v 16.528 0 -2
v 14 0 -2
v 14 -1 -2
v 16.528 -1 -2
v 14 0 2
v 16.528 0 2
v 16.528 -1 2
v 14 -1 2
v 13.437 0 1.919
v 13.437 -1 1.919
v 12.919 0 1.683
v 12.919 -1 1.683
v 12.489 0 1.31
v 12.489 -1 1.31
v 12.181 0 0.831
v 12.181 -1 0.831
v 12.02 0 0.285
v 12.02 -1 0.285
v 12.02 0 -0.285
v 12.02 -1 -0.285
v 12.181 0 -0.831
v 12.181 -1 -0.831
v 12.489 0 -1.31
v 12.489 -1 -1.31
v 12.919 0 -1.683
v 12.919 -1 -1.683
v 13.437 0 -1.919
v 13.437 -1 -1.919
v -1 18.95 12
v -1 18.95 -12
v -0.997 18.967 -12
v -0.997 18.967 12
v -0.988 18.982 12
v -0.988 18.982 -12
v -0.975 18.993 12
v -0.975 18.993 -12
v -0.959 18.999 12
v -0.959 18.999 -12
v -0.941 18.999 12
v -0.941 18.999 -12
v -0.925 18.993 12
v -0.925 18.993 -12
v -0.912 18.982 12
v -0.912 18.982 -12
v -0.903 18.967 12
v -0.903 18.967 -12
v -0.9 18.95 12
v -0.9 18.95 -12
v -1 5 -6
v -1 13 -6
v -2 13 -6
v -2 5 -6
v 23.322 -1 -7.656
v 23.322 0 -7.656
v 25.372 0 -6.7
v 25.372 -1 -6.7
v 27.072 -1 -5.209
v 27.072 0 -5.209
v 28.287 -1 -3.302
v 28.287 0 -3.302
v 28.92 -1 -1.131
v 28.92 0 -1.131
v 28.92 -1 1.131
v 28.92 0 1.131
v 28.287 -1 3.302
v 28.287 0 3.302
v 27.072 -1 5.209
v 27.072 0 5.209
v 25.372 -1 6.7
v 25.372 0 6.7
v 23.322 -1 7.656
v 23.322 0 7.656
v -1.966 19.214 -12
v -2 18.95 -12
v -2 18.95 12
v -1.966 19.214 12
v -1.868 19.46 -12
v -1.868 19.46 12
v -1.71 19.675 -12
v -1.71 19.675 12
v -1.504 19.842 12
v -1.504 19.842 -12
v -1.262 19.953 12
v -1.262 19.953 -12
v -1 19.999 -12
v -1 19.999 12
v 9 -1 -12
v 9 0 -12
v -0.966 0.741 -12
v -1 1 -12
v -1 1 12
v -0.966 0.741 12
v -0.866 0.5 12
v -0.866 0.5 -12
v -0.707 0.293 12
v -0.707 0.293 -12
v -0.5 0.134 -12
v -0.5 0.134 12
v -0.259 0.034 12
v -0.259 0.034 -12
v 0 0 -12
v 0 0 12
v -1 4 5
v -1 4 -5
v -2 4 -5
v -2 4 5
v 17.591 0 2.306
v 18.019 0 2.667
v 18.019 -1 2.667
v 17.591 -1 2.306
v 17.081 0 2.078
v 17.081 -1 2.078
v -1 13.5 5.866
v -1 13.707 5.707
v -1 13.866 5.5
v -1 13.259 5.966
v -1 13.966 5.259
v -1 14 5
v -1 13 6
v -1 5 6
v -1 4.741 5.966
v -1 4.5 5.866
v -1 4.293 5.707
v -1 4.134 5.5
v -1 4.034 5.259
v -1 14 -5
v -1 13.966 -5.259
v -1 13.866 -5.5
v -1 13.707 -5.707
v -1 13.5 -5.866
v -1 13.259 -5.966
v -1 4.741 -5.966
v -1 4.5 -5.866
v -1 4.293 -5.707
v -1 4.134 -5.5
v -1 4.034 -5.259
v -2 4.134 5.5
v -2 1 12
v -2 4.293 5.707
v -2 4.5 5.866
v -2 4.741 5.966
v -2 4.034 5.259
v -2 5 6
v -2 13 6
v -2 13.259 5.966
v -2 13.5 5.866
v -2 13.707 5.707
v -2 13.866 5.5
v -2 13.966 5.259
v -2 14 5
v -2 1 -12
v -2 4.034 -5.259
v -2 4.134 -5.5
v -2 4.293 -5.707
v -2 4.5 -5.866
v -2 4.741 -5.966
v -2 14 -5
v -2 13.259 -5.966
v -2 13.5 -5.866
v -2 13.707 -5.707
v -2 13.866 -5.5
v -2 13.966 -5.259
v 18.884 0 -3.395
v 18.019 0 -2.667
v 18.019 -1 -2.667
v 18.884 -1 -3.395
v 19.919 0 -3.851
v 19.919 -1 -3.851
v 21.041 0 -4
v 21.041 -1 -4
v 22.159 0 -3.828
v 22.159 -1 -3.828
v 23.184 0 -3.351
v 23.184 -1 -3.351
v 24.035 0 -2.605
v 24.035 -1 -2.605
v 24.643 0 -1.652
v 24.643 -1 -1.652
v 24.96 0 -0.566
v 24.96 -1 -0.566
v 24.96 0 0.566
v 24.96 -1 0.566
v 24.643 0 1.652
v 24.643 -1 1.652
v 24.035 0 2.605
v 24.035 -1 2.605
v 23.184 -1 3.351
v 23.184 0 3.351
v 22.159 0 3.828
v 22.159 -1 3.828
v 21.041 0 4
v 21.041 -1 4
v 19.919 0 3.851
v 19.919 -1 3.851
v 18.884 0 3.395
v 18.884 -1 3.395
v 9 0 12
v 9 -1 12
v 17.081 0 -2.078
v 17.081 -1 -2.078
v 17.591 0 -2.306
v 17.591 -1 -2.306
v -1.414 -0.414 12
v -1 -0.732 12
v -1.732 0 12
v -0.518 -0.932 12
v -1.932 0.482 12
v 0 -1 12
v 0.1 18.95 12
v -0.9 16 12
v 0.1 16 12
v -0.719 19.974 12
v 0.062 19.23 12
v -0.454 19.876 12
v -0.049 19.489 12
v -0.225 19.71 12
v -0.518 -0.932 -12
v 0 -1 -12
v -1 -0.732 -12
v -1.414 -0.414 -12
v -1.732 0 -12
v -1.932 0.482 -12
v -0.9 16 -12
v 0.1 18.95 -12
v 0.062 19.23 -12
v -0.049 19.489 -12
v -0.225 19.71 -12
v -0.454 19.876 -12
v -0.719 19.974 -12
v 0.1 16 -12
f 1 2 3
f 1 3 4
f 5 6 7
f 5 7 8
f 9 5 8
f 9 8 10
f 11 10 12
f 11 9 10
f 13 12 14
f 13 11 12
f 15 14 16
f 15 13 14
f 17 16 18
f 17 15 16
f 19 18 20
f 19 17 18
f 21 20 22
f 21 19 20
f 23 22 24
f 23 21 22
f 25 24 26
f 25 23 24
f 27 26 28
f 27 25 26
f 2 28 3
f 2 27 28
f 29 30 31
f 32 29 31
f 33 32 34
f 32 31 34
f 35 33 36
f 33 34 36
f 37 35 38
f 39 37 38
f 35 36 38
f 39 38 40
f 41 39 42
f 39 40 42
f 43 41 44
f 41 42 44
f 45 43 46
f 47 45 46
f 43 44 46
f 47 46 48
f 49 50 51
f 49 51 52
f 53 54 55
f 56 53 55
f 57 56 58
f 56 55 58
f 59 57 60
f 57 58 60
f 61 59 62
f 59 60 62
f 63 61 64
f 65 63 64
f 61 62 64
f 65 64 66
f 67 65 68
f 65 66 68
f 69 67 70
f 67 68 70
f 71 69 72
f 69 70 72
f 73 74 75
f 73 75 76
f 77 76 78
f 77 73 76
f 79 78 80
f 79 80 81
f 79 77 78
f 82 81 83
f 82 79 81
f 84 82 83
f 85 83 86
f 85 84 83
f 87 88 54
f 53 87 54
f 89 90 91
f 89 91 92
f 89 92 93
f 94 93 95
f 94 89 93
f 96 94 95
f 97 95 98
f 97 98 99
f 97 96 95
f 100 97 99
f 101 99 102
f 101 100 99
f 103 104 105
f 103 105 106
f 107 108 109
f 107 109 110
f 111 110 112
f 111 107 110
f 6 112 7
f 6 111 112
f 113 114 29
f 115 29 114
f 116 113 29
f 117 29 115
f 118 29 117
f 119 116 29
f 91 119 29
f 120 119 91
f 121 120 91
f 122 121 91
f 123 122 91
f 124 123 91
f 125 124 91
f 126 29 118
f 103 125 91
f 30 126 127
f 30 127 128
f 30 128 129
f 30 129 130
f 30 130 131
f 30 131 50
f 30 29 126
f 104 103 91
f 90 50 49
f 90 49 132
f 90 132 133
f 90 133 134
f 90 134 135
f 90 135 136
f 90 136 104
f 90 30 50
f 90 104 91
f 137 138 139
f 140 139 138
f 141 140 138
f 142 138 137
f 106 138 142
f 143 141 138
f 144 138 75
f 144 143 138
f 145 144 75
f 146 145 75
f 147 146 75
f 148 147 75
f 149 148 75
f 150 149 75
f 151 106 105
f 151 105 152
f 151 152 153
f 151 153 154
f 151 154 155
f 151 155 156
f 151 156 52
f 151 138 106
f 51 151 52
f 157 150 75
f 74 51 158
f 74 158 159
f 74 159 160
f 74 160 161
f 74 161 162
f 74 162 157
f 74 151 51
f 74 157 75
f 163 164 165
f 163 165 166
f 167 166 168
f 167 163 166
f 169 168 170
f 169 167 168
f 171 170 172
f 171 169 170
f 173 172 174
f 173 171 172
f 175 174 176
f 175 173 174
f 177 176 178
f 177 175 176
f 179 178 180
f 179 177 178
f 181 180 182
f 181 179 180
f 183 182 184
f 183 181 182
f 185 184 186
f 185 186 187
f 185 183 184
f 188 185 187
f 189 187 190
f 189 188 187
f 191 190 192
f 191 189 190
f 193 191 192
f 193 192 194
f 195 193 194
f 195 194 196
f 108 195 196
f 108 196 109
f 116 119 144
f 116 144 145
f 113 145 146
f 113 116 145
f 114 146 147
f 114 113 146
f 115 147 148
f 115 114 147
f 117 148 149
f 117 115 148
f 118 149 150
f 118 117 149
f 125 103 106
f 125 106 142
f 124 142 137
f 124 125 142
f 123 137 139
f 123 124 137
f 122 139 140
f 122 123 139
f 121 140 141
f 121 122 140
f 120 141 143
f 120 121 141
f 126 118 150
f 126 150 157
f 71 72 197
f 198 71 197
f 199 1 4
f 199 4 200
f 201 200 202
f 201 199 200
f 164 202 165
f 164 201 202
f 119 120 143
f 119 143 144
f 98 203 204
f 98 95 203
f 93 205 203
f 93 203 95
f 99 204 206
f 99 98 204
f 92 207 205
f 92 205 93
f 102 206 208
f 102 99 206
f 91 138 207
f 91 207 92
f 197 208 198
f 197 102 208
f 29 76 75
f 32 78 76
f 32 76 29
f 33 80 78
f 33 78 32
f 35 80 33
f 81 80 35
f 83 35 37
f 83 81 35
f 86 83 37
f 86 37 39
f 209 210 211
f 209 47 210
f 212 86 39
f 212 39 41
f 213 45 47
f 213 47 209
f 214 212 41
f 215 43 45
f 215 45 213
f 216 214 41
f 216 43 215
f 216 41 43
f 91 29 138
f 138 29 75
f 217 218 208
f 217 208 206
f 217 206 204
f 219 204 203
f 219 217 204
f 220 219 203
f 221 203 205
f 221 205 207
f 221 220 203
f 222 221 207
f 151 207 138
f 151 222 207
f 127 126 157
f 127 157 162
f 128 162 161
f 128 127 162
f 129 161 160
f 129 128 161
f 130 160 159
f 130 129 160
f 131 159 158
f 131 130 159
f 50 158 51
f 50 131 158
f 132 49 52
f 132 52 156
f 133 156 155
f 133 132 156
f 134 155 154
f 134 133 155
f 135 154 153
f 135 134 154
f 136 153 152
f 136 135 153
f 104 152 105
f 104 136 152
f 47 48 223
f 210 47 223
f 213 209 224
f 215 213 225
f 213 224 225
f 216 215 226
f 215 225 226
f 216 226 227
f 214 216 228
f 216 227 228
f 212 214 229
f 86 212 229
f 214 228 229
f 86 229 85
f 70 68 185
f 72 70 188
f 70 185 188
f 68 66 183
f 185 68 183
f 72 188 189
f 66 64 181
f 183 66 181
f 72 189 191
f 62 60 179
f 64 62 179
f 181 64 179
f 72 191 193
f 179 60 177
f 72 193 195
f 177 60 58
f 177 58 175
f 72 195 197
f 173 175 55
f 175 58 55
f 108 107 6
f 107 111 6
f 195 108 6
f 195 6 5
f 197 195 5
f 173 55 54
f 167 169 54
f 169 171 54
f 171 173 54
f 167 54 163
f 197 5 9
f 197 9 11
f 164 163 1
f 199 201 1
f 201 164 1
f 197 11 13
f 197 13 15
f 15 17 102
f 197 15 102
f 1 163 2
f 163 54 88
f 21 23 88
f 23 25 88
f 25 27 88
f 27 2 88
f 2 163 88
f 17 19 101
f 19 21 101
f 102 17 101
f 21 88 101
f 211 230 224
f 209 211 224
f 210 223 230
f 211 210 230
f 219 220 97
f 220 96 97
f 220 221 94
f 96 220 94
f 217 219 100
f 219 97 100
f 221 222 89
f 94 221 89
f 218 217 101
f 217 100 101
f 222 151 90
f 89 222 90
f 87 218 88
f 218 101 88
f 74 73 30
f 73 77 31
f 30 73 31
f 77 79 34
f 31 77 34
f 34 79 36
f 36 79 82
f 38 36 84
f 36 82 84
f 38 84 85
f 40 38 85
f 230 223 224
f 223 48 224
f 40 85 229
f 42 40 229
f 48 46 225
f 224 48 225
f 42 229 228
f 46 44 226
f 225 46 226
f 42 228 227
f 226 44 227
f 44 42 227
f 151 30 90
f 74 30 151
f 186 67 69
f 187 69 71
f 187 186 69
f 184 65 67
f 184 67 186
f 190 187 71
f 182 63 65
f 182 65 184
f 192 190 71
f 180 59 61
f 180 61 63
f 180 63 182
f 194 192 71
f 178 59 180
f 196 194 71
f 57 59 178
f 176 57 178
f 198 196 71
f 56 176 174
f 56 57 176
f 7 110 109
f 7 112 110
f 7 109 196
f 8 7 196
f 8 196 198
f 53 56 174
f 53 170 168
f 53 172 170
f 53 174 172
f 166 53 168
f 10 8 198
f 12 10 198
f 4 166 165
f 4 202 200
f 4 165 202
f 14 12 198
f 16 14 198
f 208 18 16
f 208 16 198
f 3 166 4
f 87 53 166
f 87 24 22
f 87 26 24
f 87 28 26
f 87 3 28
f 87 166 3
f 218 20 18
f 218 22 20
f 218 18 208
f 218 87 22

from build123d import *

# Parameters (mm, degrees)
BASE_FLANGE1_DEPTH = 1
EDGE_FLANGE1_DEPTH = 24
HEM1_START         = -12
HEM1_DEPTH         = 24
HEM1_2_DEPTH       = 24
CUT_EXTRUDE1_DEPTH = 10


# Read off the part's stored shape, not the designer's step: Hem1
# Sheet-metal steps are written as plain solids
with BuildPart() as part:
    # Sketch1 → Base-Flange1 (new body)
    with BuildSketch(Plane(origin=(0, 0, 0), x_dir=(1, 0, 0), z_dir=(0, 1, 0))):
        with BuildLine():
            Line((0, 12), (9, 12))
            Line((9, 12), (23.322209849, 7.655543182))
            ThreePointArc((23.322209849, 7.655543182), (29, 0), (23.322209849, -7.655543182))
            Line((23.322209849, -7.655543182), (9, -12))
            Line((9, -12), (0, -12))
            Line((0, -12), (0, 12))
        make_face()
        with BuildLine():
            Line((14, 2), (16.527864045, 2))
            ThreePointArc((16.527864045, 2), (17.344360626, 2.174258142), (18.01857603, 2.666666667))
            ThreePointArc((18.01857603, 2.666666667), (25, 0), (18.01857603, -2.666666667))
            ThreePointArc((18.01857603, -2.666666667), (17.344360626, -2.174258142), (16.527864045, -2))
            Line((16.527864045, -2), (14, -2))
            ThreePointArc((14, -2), (12, 0), (14, 2))
        make_face(mode=Mode.SUBTRACT)
    extrude(amount=-BASE_FLANGE1_DEPTH)

    # Edge-Flange1 section (across the edge) → Edge-Flange1 (add)
    with BuildSketch(Plane(origin=(-1, 0, -12), x_dir=(1, 0, 0), z_dir=(0, 0, 1))):
        with BuildLine():
            Line((-1, 1), (-1, 20))
            Line((-1, 20), (0, 20))
            Line((0, 20), (0, 1))
            ThreePointArc((0, 1), (0.292893219, 0.292893219), (1, 0))
            Line((1, 0), (1, -1))
            ThreePointArc((1, -1), (-0.414213562, -0.414213562), (-1, 1))
        make_face()
    extrude(amount=EDGE_FLANGE1_DEPTH)

    # Hem1 outline → Hem1 (cut)
    with BuildSketch(Plane.XY.offset(HEM1_START)):
        with BuildLine():
            ThreePointArc((-2, 18.95), (-1.709934208, 19.674568837), (-1, 19.998808848))
            Line((-1, 19.998808848), (-1, 20))
            Line((-1, 20), (-2, 20))
            Line((-2, 20), (-2, 18.95))
        make_face()
    extrude(amount=HEM1_DEPTH, mode=Mode.SUBTRACT)

    # Hem1 2 outline → Hem1 2 (add)
    with BuildSketch(Plane.XY.offset(HEM1_START)):
        with BuildLine():
            Line((-0.9, 16), (0.1, 16))
            Line((0.1, 16), (0.1, 18.95))
            ThreePointArc((0.1, 18.95), (-0.225431163, 19.709934208), (-1, 19.998808848))
            Line((-1, 19.998808848), (-1, 18.95))
            ThreePointArc((-1, 18.95), (-0.95, 19), (-0.9, 18.95))
            Line((-0.9, 18.95), (-0.9, 16))
        make_face()
    extrude(amount=HEM1_2_DEPTH)

    # Sketch13 → Cut-Extrude1 (cut)
    with BuildSketch(Plane(origin=(-1, 0, 0), x_dir=(0, 0, -1), z_dir=(1, 0, 0))):
        with BuildLine():
            Line((-5, 14), (5, 14))
            ThreePointArc((5, 14), (5.707106781, 13.707106781), (6, 13))
            Line((6, 13), (6, 5))
            ThreePointArc((6, 5), (5.707106781, 4.292893219), (5, 4))
            Line((5, 4), (-5, 4))
            ThreePointArc((-5, 4), (-5.707106781, 4.292893219), (-6, 5))
            Line((-6, 5), (-6, 13))
            ThreePointArc((-6, 13), (-5.707106781, 13.707106781), (-5, 14))
        make_face()
    extrude(amount=-CUT_EXTRUDE1_DEPTH, mode=Mode.SUBTRACT)


solid = part.part
